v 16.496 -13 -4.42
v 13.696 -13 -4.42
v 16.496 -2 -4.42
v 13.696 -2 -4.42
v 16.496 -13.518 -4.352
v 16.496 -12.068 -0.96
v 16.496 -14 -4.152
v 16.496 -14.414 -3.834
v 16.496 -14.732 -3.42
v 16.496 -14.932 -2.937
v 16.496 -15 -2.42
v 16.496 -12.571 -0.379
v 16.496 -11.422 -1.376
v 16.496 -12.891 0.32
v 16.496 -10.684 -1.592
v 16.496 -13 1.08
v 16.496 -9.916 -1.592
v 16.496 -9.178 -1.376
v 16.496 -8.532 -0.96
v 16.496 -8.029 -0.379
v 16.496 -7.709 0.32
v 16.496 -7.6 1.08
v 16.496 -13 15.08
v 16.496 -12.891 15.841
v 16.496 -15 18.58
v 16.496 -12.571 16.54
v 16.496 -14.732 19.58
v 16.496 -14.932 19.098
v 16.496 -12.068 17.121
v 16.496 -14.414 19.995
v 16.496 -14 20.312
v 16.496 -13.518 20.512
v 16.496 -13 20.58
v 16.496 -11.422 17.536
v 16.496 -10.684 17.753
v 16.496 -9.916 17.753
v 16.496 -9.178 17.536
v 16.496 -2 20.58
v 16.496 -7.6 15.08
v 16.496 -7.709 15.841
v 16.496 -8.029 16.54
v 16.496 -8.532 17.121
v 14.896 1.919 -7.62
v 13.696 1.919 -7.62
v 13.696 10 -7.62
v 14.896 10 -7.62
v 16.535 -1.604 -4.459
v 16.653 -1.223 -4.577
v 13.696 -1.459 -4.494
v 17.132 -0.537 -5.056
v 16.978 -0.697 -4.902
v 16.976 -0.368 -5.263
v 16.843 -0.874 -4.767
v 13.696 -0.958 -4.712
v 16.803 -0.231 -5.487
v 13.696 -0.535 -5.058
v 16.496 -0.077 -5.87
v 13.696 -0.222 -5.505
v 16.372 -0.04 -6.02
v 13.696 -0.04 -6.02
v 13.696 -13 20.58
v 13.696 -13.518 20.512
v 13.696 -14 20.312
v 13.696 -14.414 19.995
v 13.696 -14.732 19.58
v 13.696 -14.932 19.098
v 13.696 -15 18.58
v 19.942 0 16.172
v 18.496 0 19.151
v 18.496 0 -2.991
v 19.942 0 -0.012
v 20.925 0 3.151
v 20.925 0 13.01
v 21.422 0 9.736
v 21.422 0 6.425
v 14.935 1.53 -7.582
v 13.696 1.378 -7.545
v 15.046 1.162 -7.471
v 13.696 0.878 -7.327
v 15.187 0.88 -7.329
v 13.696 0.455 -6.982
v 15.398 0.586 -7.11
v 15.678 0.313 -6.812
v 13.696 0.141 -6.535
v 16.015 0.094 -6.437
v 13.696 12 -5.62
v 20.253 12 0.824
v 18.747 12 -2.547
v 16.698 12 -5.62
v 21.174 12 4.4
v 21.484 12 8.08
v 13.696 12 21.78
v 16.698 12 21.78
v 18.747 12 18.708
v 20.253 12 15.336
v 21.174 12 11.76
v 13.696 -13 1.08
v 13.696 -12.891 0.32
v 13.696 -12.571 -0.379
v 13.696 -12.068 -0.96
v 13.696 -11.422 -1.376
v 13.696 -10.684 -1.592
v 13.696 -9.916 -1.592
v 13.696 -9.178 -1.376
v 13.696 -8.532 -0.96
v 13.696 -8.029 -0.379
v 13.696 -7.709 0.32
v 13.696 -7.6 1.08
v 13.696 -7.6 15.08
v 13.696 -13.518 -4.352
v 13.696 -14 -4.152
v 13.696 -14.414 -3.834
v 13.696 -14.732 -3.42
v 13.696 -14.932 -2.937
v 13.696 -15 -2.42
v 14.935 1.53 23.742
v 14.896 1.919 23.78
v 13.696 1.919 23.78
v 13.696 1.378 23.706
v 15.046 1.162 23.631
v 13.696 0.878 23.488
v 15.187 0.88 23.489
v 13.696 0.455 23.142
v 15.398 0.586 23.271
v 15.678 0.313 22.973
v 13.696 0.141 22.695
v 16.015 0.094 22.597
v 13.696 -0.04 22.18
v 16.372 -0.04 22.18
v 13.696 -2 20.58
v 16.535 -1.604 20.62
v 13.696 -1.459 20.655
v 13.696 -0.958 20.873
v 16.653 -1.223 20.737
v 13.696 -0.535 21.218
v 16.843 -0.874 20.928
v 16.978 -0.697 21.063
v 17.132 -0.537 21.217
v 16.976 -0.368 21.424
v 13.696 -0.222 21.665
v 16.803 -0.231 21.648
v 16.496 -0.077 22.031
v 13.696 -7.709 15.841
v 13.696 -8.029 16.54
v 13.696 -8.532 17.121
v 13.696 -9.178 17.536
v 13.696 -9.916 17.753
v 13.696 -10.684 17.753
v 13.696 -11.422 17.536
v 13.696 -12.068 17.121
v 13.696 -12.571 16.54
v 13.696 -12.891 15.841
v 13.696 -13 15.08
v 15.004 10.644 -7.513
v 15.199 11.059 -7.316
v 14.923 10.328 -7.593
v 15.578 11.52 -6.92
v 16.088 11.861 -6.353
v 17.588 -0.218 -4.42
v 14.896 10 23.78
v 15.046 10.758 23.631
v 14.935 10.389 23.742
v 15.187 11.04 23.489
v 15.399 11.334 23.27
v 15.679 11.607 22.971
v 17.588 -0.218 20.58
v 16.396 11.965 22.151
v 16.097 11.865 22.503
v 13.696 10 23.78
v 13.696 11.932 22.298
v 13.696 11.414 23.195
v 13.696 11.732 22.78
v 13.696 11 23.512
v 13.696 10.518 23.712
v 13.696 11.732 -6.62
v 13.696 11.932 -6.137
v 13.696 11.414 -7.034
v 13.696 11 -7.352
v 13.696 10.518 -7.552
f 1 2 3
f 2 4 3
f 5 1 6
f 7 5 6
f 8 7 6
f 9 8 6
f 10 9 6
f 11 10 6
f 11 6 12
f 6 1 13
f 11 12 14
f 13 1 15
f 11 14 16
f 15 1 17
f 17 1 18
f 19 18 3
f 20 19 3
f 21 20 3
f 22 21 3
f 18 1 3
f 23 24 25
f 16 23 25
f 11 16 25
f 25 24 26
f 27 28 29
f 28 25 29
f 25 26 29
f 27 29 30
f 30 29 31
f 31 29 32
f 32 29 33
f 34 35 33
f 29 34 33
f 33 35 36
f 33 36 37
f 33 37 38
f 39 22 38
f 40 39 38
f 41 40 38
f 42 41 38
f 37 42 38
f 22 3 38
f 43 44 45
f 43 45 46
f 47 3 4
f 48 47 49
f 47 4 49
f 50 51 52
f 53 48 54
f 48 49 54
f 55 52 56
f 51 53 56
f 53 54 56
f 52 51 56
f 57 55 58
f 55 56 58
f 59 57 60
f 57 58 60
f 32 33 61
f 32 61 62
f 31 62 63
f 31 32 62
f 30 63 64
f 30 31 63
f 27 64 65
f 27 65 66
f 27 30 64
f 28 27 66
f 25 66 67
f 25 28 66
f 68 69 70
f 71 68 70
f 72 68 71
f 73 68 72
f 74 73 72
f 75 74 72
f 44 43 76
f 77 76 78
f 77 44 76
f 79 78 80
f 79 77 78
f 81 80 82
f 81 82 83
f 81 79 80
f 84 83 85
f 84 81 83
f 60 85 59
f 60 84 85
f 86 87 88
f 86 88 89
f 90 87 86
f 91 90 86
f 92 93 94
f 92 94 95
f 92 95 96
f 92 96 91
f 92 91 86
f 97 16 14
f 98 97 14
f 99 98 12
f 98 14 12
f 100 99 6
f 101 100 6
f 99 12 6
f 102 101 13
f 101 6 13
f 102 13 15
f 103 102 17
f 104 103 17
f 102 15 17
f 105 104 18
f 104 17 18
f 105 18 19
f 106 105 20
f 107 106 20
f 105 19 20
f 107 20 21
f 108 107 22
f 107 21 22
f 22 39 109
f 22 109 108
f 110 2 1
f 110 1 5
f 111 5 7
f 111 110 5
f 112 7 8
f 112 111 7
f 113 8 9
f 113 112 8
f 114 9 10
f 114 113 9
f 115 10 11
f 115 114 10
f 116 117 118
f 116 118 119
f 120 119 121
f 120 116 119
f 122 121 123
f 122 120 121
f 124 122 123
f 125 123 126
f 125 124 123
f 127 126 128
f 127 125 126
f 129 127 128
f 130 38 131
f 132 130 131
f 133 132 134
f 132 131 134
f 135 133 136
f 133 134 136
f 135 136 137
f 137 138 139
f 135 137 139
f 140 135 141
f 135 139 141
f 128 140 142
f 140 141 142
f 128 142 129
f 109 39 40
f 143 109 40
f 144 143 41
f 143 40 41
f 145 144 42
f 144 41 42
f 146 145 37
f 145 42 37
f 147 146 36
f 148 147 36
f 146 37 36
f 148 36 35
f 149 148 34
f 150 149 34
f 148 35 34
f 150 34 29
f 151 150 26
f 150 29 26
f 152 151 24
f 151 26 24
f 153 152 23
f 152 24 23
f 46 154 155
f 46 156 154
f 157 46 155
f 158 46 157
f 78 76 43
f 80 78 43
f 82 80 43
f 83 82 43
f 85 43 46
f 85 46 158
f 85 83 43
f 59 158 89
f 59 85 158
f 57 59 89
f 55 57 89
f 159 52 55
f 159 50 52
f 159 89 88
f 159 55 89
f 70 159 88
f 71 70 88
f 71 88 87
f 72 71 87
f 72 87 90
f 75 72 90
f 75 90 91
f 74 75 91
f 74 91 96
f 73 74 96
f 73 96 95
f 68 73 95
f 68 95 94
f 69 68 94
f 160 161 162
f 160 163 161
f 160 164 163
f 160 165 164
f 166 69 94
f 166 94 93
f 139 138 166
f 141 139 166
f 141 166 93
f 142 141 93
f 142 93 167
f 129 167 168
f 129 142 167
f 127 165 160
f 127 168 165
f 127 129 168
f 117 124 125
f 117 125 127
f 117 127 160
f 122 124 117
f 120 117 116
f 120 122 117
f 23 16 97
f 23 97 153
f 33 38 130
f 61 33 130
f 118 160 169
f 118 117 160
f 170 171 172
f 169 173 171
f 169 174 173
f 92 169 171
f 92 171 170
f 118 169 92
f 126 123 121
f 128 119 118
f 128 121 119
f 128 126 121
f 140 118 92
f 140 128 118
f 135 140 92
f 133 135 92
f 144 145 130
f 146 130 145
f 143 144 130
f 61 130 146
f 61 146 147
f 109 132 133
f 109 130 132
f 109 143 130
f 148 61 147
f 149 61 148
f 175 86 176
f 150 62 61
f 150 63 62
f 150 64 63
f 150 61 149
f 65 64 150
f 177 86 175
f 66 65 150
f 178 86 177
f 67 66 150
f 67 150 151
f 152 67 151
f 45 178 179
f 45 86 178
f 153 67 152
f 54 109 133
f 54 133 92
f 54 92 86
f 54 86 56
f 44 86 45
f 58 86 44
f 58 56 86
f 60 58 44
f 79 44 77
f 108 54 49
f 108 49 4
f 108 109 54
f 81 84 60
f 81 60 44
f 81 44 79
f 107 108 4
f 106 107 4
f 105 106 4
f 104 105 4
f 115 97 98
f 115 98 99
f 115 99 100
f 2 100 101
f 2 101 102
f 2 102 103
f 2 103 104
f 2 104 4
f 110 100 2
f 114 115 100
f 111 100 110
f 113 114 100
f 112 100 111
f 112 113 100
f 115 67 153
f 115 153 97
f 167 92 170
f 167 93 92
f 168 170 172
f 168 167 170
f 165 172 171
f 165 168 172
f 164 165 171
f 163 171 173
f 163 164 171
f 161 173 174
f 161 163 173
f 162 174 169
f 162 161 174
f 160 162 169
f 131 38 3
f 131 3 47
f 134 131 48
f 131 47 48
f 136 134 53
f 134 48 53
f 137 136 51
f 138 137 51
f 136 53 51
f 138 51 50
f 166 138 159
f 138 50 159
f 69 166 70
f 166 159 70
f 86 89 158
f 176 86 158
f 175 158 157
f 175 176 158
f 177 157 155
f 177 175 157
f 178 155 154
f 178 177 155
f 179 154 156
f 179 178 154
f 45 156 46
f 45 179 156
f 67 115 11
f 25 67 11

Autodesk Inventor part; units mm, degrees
ref_plane "YZ Plane" through (0, 0, 0) normal (1, 0, 0) x (0, 1, 0)
ref_plane "XZ Plane" through (0, 0, 0) normal (0, 1, 0) x (-1, 0, 0)
ref_plane "XY Plane" through (0, 0, 0) normal (0, 0, 1) x (1, 0, 0)
sketch "Boceto1" plane through (0, 0, 0) normal (0, 1, 0) x (-1, 0, 0)
  line L0 (-14.8958, 23.7803) -> (7.8042, 23.7803)
  line L1 (7.8042, 23.7803) -> (7.8042, -7.6197)
  line L2 (7.8042, -7.6197) -> (-14.8958, -7.6197)
  line L3 (-14.8958, -7.6197) -> (-14.8958, 23.7803)
  line L4 (-14.8958, 23.7803) -> (7.8042, -7.6197) construction
  line L5 (7.8042, 23.7803) -> (-14.8958, -7.6197) construction
  arc A0 (-14.8958, 23.7803) -> (-14.8958, -7.6197) centre (0.5156, 8.0803) ccw
  line L6 (7.8042, 17.8112) -> (7.8042, 23.7803)
  line L7 (-13.6958, 20.5803) -> (6.6042, 20.5803)
  line L8 (6.6042, 20.5803) -> (6.6042, -4.4197)
  line L9 (6.6042, -4.4197) -> (-13.6958, -4.4197)
  line L10 (-13.6958, -4.4197) -> (-13.6958, 20.5803)
  line L11 (-13.6958, 20.5803) -> (6.6042, -4.4197) construction
  line L12 (6.6042, 20.5803) -> (-13.6958, -4.4197) construction
  line L13 (7.8042, 23.7803) -> (11.6042, 23.7803)
  line L14 (11.6042, 23.7803) -> (11.6042, -7.6197)
  line L15 (11.6042, -7.6197) -> (7.8042, -7.6197)
  line L16 (7.8042, -7.6197) -> (7.8042, 23.7803)
  line L17 (7.8042, 23.7803) -> (6.6042, 23.7803)
  line L18 (6.6042, 23.7803) -> (6.6042, -7.6197)
  line L19 (6.6042, -7.6197) -> (7.8042, -7.6197)
  line L20 (7.8042, -7.6197) -> (7.8042, 23.7803)
  line L21 (11.6042, -7.6197) -> (6.6042, -7.6197)
  line L22 (6.6042, -7.6197) -> (6.6042, -4.4197)
  line L23 (6.6042, -4.4197) -> (11.6042, -4.4197)
  line L24 (11.6042, -4.4197) -> (11.6042, -7.6197)
  line L25 (11.6042, 23.7803) -> (6.6042, 23.7803)
  line L26 (6.6042, 23.7803) -> (6.6042, 20.5803)
  line L27 (6.6042, 20.5803) -> (11.6042, 20.5803)
  line L28 (11.6042, 20.5803) -> (11.6042, 23.7803)
  line L29 (-14.8958, 23.7803) -> (-13.6958, 23.7803)
  line L30 (-13.6958, 23.7803) -> (-13.6958, -7.6197)
  line L31 (-13.6958, -7.6197) -> (-14.8958, -7.6197)
  line L32 (-14.8958, -7.6197) -> (-14.8958, 23.7803)
  point P0 (-3.5458, 8.0803)
  point P1 (6.6042, -4.4197)
  point P2 (6.6042, 20.5803)
  point P3 (6.6042, 23.7803)
  point P4 (6.6042, 20.5803)
  point P5 (11.6042, -4.4197)
  point P6 (6.6042, -4.4197)
  dimension "d4" = 25
  dimension "d5" = 3.2
  dimension "d6" = 1.2
  dimension "d7" = 20.3
  dimension "d14" = 5
  dimension "d34" = 22
extrude "Extrusión1" add sketch "Boceto1" along normal blind 12 contours L0 L30 L10 L2 L3 | L3 A0
sketch "Boceto3" plane through (0, 0, 0) normal (0, -1, 0) x (1, 0, 0)
  line L0 (10.8958, -4.4197) -> (16.4958, -4.4197)
  line L1 (16.4958, -4.4197) -> (16.4958, 20.5803)
  line L2 (16.4958, 20.5803) -> (10.8958, 20.5803)
  line L3 (10.8958, 20.5803) -> (10.8958, -4.4197)
  line L4 (13.6958, -7.6197) -> (13.6958, 23.7803) projected
  line L5 (10.8958, -4.4197) -> (16.4958, 20.5803) construction
  line L6 (16.4958, -4.4197) -> (10.8958, 20.5803) construction
  point P0 (0, 0)
  point P1 (13.6958, 8.0803)
  point P2 (13.6958, 20.5803)
  point P3 (13.6958, -4.4197)
  dimension "d18" = 25
  dimension "d19" = 2.8
extrude "Extrusión3" add sketch "Boceto3" along normal blind 15 contours L4 L2 L1 L0
fillet "Empalme2" radius 2 9 edges at (15.0958, 0, 20.5803) (15.0958, -15, 20.5803) (15.0958, -15, -4.4197) (15.0958, 0, -4.4197) (14.2958, 0, -7.6197) (14.2958, 12, -7.6197) (14.2958, 0, 23.7803) (14.2958, 12, 23.7803) (16.4958, 0, 8.0803)
sketch "Boceto4" plane through (16.4958, -13, -4.4197) normal (1, 0, 0) x (0, 0, -1)
  circle A0 centre (-19.5, 2.7) radius 2.7
  circle A1 centre (-5.5, 2.7) radius 2.7
  line L0 (-19.5, 5.4) -> (-5.5, 5.4)
  line L1 (-5.5, 5.4) -> (-5.5, 0)
  line L2 (-5.5, 0) -> (-19.5, 0)
  line L3 (-19.5, 0) -> (-19.5, 5.4)
  line L4 (-25, 11) -> (-25, 0) projected
  line L5 (0, 11) -> (0, 0) projected
  line L6 (-2, -2) -> (-23, -2) projected
  point P0 (-4.4197, 13)
  point P1 (-5.5, 0)
  point P2 (-5.5, 5.4)
  point P3 (-19.5, 5.4)
  dimension "d23" = 5.4
  dimension "d24" = 5.5
  dimension "d25" = 5.5
  dimension "d26" = 2
extrude "Extrusión4" cut sketch "Boceto4" against normal through all
sketch "Boceto5" plane through (16.4958, -13, -4.4197) normal (1, 0, 0) x (0, 0, -1)
  arc A0 (-5.5, 0) -> (-5.5, 5.4) centre (-5.5, 2.7) ccw projected
  line L0 (-5.5, 0) -> (-19.5, 0) projected
  arc A1 (-19.5, 5.4) -> (-19.5, 0) centre (-19.5, 2.7) ccw projected
  line L1 (-19.5, 5.4) -> (-5.5, 5.4) projected
  arc A2 (-2, -2) -> (0, 0) centre (-2, 0) ccw projected
  line L2 (0, 11) -> (0, 0) projected
  line L3 (-25, 11) -> (0, 11) projected
  line L4 (-25, 11) -> (-25, 0) projected
  arc A3 (-25, 0) -> (-23, -2) centre (-23, 0) ccw projected
  line L5 (-2, -2) -> (-23, -2) projected
  arc A4 (-5.5, -2) -> (-5.5, 7.4) centre (-5.5, 2.7) ccw
  line L6 (-5.5, -2) -> (-19.5, -2)
  arc A5 (-19.5, 7.4) -> (-19.5, -2) centre (-19.5, 2.7) ccw
  line L7 (-19.5, 7.4) -> (-5.5, 7.4)
  point P0 (-4.4197, 13)
  point P1 (-21.3974, 7)
  point P2 (-19.5, -2)
  point P3 (-5.5, -2)
  point P4 (-3.6026, 7)
  dimension "d29" = 2
sketch "Boceto2" plane through (-6.6042, 0, 23.7803) normal (0, 0, 1) x (1, 0, 0)
  circle A0 centre (2.3, 6) radius 2.7
  line L0 (-5, 0) -> (21.5, 0) projected
  circle A1 centre (10.3, 6) radius 2.7
  line L1 (2.3, 3.3) -> (10.3, 3.3)
  line L2 (10.3, 3.3) -> (10.3, 8.7)
  line L3 (10.3, 8.7) -> (2.3, 8.7)
  line L4 (2.3, 8.7) -> (2.3, 3.3)
  point P0 (6.6042, 0)
  point P1 (20.3, 0)
  dimension "d10" = 5.4
  dimension "d11" = 6
  dimension "d12" = 10
  dimension "d13" = 8
properties part number "yystop"
